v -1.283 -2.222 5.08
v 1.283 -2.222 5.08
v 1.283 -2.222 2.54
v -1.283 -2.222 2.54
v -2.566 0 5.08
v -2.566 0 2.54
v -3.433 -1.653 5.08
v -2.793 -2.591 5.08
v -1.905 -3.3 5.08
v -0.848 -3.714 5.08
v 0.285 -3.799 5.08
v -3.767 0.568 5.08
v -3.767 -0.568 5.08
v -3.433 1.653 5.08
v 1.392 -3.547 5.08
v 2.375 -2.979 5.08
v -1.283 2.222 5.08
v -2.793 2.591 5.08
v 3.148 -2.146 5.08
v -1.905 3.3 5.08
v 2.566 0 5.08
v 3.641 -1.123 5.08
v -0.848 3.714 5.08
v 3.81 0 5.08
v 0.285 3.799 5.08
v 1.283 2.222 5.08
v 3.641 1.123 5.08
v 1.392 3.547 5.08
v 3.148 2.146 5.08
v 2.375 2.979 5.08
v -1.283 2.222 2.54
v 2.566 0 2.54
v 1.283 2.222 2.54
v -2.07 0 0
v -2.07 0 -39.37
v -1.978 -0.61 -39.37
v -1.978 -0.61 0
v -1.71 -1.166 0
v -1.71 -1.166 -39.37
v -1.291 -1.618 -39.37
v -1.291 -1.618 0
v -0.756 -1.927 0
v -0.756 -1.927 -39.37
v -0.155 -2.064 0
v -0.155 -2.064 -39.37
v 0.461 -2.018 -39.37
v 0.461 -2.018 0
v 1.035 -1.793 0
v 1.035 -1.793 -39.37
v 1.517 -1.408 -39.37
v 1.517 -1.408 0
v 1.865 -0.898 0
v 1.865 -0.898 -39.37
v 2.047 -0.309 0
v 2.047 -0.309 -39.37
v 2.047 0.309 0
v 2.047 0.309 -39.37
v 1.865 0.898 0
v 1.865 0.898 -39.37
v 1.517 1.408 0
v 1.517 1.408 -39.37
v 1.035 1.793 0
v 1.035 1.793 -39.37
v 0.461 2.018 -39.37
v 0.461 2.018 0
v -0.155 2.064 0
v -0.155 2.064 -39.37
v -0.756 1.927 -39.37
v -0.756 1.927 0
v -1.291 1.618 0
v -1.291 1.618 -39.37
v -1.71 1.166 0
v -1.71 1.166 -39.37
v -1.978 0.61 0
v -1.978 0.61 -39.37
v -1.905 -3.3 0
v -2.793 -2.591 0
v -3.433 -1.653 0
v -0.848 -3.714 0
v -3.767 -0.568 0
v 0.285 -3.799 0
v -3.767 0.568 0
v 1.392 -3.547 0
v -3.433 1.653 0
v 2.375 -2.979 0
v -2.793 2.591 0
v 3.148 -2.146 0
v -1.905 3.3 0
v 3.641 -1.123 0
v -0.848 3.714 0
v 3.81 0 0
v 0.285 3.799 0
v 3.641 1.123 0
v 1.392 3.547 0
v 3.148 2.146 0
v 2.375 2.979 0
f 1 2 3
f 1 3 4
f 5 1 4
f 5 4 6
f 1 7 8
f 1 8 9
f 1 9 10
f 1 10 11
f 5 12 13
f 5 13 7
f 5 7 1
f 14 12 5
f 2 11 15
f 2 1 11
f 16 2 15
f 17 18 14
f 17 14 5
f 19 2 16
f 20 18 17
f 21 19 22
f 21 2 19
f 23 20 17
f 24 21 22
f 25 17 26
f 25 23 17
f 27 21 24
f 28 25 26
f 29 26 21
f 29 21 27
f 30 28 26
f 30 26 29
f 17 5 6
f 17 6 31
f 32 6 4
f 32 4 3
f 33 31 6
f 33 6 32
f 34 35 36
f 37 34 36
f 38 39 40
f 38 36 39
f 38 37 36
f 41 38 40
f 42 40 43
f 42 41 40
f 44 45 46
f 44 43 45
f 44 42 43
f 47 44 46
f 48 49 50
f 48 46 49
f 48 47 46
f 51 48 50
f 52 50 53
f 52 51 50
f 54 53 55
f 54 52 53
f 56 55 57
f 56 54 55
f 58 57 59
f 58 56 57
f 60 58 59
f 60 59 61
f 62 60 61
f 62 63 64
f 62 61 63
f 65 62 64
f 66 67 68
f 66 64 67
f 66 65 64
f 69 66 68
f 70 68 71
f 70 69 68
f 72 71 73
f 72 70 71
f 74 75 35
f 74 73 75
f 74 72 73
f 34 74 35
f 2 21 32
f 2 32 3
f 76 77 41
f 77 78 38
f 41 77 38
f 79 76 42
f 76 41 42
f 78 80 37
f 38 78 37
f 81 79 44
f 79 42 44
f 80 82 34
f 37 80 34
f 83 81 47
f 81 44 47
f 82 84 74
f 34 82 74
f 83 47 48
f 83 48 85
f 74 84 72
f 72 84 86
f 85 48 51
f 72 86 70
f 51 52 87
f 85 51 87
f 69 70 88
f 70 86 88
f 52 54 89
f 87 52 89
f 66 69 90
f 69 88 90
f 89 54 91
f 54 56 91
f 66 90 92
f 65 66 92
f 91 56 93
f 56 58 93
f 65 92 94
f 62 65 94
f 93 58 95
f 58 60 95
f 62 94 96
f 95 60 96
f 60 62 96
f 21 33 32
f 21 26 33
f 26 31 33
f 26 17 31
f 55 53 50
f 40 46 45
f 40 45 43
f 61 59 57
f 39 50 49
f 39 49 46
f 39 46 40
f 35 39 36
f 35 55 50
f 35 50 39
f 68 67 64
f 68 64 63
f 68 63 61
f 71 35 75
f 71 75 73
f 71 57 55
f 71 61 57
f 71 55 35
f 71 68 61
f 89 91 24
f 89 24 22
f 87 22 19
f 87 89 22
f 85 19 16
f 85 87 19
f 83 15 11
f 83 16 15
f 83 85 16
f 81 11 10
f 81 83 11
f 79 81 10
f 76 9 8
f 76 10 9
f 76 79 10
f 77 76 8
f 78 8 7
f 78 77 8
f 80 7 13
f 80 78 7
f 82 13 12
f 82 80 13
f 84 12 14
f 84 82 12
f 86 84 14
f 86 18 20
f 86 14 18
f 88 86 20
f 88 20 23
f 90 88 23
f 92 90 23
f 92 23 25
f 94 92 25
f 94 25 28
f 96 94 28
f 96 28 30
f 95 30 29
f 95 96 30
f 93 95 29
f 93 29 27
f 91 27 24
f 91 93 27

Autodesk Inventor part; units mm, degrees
ref_plane "YZ Plane" through (0, 0, 0) normal (1, 0, 0) x (0, 1, 0)
ref_plane "XZ Plane" through (0, 0, 0) normal (0, 1, 0) x (-1, 0, 0)
ref_plane "XY Plane" through (0, 0, 0) normal (0, 0, 1) x (1, 0, 0)
sketch "Sketch1" plane through (0, 0, 0) normal (0, 0, 1) x (1, 0, 0)
  circle A0 centre (0, 0) radius 3.81
  dimension "d0" = 7.62
extrude "Extrusion1" add sketch "Sketch1" along normal blind 5.08
sketch "Sketch2" plane through (0, 0, 5.08) normal (0, 0, 1) x (1, 0, 0)
  line L0 (1.2832, 2.2225) -> (2.5663, 0)
  line L1 (2.5663, 0) -> (1.2832, -2.2225)
  line L2 (1.2832, -2.2225) -> (-1.2832, -2.2225)
  line L3 (-1.2832, -2.2225) -> (-2.5663, 0)
  line L4 (-2.5663, 0) -> (-1.2832, 2.2225)
  line L5 (-1.2832, 2.2225) -> (1.2832, 2.2225)
  line L6 (0, 0) -> (0.4307, 0)
  dimension "d3" = 4.445
extrude "Extrusion2" cut sketch "Sketch2" against normal blind 2.54
sketch "Sketch3" plane through (0, 0, 0) normal (0, 0, -1) x (-1, 0, 0)
  circle A0 centre (0, 0) radius 2.0701
  dimension "d6" = 4.1402
extrude "Extrusion3" add sketch "Sketch3" along normal blind 39.37
properties part number "RobotArm Rivet2"
